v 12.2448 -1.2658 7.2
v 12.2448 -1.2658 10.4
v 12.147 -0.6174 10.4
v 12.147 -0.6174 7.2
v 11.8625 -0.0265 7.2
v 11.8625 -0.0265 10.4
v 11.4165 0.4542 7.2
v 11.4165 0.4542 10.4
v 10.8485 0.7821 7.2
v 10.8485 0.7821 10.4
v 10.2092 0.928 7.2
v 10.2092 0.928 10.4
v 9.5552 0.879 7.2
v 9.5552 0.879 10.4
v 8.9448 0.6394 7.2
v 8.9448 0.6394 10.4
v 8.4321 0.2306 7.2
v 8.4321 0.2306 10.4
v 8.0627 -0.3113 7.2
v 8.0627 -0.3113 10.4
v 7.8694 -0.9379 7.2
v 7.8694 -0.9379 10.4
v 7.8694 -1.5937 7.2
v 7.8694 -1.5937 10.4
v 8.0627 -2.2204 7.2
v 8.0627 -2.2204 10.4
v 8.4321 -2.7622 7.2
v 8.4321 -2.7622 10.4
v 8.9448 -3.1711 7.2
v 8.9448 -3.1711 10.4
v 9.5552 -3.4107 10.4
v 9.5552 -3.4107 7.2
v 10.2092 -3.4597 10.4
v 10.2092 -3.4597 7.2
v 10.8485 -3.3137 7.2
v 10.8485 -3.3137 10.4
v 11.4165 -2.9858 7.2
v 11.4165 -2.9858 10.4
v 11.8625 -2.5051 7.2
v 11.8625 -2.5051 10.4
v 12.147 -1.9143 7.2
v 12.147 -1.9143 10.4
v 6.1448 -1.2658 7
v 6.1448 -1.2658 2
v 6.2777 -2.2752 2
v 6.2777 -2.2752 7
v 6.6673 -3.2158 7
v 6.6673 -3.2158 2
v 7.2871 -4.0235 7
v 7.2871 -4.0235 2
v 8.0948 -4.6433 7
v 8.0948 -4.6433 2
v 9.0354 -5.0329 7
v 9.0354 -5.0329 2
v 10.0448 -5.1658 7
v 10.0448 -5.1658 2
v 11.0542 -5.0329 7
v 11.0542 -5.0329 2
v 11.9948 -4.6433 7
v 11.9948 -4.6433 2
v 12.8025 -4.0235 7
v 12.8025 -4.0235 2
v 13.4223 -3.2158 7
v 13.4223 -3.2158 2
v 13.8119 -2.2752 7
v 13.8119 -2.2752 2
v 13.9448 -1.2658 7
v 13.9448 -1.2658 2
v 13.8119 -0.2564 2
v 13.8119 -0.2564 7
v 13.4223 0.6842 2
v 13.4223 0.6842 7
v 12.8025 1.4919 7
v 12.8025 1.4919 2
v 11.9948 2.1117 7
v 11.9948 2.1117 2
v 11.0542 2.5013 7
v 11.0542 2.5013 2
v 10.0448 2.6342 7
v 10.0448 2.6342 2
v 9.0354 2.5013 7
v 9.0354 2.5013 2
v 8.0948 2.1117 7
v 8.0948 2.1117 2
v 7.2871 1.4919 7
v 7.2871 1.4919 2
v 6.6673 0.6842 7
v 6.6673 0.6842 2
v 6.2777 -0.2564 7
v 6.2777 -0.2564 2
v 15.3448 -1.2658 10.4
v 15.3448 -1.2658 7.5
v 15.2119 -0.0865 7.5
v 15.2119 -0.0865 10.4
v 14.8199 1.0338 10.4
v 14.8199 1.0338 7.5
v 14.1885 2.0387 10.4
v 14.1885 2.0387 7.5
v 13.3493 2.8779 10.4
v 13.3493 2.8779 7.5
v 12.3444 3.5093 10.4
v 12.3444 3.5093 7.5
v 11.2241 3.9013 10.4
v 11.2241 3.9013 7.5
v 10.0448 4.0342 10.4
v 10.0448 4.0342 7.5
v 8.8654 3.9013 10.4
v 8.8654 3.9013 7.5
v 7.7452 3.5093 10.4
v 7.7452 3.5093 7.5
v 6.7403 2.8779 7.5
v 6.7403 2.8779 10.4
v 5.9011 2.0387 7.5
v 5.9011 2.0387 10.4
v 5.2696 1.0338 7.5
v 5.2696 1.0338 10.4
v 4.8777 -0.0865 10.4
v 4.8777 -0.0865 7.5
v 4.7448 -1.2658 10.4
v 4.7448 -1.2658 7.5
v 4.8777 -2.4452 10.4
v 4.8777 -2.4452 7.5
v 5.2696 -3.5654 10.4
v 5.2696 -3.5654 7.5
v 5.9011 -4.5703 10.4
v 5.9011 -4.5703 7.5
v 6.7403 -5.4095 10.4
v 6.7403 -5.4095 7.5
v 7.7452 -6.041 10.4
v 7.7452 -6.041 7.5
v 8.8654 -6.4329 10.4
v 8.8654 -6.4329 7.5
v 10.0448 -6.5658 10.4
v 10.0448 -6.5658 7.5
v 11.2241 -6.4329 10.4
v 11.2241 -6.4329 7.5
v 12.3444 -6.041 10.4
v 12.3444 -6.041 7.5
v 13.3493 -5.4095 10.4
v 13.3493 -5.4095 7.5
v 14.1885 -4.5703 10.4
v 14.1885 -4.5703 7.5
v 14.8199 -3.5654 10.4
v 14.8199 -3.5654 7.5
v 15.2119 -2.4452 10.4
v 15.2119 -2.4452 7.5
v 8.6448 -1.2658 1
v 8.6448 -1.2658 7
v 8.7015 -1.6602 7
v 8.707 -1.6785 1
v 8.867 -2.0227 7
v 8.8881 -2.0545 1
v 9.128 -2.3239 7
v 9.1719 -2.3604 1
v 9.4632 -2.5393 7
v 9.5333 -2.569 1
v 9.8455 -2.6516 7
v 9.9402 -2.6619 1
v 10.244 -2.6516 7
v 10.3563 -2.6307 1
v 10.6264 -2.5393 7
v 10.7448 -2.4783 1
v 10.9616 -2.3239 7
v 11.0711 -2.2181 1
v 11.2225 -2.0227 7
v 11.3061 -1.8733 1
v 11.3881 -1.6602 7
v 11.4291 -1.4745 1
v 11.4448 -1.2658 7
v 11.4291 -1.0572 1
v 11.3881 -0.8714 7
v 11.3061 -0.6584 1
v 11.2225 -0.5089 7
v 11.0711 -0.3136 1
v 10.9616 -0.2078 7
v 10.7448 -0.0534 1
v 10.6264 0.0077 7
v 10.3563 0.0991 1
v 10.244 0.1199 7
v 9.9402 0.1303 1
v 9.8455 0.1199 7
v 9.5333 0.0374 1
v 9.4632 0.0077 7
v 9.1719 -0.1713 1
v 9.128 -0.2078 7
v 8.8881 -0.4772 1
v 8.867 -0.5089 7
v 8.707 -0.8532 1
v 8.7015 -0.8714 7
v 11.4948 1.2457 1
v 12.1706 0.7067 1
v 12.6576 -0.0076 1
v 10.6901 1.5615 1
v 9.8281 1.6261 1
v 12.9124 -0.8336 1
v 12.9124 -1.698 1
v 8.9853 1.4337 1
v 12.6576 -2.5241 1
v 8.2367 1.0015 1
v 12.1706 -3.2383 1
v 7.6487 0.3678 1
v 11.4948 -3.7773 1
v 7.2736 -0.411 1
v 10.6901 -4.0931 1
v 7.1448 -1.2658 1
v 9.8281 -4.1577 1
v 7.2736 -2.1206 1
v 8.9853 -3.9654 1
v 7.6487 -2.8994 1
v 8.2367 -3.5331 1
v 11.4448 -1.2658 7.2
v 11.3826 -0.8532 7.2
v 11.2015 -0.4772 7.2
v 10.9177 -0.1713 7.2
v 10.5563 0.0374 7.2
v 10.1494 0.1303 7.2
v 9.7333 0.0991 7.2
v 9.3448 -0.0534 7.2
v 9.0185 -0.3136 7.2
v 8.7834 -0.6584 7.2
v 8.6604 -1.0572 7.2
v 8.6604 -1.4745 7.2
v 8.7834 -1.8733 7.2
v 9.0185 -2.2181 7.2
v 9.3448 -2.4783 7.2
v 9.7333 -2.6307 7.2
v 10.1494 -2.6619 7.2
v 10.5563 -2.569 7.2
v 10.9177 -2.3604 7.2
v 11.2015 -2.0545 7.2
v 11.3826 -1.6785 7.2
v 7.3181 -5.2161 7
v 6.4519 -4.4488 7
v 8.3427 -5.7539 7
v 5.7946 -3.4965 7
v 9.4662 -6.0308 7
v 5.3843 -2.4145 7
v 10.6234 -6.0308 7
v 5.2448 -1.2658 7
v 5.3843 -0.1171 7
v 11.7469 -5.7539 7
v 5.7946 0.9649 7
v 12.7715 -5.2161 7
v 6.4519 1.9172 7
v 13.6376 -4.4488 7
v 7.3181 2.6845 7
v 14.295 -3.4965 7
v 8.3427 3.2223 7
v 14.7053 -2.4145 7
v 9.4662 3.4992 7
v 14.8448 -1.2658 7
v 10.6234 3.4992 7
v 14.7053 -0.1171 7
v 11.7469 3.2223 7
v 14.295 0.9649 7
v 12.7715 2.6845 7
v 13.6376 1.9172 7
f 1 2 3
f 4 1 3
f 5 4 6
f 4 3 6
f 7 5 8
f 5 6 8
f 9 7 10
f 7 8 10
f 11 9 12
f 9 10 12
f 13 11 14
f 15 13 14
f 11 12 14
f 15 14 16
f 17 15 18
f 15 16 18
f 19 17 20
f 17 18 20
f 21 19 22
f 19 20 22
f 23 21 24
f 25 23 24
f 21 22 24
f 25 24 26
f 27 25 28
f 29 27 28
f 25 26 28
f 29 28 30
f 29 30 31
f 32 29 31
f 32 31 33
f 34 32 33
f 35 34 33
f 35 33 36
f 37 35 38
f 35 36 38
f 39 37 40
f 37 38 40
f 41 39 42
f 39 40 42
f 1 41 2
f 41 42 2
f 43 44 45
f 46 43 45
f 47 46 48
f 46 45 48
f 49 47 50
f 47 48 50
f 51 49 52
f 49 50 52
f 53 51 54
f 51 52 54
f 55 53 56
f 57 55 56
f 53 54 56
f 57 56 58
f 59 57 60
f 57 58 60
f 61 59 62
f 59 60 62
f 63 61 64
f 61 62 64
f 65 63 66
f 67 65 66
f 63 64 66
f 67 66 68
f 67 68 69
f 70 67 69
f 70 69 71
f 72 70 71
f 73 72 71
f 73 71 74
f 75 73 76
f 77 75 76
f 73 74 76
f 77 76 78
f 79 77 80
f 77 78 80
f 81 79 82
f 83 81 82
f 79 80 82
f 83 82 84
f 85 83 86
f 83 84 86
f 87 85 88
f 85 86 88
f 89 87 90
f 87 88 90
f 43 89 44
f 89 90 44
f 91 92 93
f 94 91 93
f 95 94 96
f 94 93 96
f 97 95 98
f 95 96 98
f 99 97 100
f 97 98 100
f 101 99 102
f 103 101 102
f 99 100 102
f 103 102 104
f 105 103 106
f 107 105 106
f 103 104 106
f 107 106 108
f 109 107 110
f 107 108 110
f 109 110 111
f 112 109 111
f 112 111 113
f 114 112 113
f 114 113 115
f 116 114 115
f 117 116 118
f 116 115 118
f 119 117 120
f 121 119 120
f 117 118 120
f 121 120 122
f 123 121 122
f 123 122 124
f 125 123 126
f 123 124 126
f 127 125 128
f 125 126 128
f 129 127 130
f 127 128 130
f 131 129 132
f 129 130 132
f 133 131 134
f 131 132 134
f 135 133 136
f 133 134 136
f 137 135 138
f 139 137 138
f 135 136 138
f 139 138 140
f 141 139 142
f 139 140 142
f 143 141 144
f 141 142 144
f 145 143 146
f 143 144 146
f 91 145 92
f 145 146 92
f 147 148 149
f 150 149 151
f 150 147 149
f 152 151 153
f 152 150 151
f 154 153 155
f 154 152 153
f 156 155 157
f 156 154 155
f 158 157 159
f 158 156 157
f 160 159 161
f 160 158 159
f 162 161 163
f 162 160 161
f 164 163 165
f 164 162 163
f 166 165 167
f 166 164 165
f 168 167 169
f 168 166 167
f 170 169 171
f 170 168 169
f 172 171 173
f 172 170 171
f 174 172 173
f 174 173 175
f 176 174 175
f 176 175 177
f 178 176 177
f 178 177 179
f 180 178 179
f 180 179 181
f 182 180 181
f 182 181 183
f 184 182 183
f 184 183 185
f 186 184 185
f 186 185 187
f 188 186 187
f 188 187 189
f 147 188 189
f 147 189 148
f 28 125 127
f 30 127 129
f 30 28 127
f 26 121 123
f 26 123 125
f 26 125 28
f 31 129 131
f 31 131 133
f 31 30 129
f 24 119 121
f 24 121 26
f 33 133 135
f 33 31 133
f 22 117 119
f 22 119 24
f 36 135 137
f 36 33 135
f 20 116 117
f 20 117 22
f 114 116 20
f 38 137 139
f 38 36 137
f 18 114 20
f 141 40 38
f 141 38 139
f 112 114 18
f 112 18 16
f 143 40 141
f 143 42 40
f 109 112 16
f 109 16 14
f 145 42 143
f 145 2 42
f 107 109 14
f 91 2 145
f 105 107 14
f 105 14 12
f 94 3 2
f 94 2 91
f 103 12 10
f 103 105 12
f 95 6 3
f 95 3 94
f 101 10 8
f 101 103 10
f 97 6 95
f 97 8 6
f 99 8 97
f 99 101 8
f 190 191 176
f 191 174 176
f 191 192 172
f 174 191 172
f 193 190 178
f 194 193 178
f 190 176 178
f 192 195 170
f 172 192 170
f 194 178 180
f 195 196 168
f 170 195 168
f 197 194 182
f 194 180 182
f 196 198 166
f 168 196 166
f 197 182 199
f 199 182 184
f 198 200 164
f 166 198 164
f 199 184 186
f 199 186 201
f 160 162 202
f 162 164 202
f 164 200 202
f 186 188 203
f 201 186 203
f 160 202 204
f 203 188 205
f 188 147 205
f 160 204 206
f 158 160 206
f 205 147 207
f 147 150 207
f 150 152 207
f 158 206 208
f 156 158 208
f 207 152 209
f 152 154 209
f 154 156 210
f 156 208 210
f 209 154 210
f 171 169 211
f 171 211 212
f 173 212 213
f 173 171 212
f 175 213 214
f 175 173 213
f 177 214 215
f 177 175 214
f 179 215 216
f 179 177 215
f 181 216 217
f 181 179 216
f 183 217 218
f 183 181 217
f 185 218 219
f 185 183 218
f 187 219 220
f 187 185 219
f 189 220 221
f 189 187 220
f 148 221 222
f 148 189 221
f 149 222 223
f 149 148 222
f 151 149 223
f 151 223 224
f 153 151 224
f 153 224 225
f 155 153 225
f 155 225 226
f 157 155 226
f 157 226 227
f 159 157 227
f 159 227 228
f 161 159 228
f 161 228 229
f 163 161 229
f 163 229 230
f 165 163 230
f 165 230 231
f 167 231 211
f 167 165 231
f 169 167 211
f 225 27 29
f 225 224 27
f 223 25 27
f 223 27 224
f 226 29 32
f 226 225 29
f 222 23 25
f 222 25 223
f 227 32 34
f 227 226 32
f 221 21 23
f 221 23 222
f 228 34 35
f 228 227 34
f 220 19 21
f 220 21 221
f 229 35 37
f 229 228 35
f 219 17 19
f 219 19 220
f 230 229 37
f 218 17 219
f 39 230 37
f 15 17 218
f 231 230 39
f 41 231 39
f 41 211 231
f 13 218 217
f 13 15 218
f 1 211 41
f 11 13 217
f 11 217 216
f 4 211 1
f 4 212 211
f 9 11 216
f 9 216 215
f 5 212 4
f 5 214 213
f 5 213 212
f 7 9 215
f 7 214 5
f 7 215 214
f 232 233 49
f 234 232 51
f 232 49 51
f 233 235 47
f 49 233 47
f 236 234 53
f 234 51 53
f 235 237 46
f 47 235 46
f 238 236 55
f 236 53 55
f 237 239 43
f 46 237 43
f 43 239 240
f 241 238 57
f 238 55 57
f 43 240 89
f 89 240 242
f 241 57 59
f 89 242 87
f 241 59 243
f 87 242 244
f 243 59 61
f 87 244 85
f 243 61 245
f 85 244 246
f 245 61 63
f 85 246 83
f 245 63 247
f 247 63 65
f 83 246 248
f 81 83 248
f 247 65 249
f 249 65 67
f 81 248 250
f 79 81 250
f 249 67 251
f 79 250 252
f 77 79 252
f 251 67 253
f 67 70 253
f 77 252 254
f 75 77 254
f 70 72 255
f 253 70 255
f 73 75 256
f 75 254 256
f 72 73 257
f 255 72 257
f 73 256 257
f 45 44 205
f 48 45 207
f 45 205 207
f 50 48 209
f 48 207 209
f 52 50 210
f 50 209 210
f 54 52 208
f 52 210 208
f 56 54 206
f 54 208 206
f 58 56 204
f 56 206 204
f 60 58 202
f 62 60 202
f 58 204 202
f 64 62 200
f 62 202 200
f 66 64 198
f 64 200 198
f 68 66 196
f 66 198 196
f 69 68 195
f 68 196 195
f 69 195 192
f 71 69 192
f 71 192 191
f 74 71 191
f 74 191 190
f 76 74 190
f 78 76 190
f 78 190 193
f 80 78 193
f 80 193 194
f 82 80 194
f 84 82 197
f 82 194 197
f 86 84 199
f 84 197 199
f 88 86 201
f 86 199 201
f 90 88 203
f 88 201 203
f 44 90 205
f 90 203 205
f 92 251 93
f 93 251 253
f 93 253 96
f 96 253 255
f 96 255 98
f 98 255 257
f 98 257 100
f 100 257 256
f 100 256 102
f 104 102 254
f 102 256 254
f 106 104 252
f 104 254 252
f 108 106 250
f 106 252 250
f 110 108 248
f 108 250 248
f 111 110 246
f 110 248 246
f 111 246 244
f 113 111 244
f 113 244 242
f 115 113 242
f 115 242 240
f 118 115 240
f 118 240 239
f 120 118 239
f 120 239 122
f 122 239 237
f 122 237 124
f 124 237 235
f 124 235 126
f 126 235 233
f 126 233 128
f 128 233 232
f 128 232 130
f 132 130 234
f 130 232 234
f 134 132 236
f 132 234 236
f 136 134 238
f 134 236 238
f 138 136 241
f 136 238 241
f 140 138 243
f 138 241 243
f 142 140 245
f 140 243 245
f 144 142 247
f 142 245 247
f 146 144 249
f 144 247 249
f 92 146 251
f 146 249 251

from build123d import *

# Parameters (mm, degrees)
BOSS_EXTRUDE1_START = 1
SKETCH1_R           = 3.9
SKETCH1_R_2         = 1.4
BOSS_EXTRUDE1_DEPTH = 6
SKETCH2_R           = 5.3
SKETCH2_R_2         = 1.4
BOSS_EXTRUDE2_DEPTH = 3.4
CHAMFER1_SIZE       = 0.5
SKETCH3_R           = 2.2
CUT_EXTRUDE1_DEPTH  = 3.2
CHAMFER2_SIZE       = 1


with BuildPart() as part:
    # Sketch1 → Boss-Extrude1 (new body)
    with BuildSketch(Plane.XY.offset(BOSS_EXTRUDE1_START)):
        with Locations(Location((10.044784941, -1.265818107, 0), (0, 0, 180))):
            Circle(SKETCH1_R)
        with Locations(Location((10.044784941, -1.265818107, 0), (0, 0, 180))):
            Circle(SKETCH1_R_2, mode=Mode.SUBTRACT)
    extrude(amount=BOSS_EXTRUDE1_DEPTH)

    # Sketch2 → Boss-Extrude2 (add)
    with BuildSketch(Plane.XY.offset(7)):
        with Locations((10.044784941, -1.265818107)):
            Circle(SKETCH2_R)
        with Locations((10.044784941, -1.265818107)):
            Circle(SKETCH2_R_2, mode=Mode.SUBTRACT)
    extrude(amount=BOSS_EXTRUDE2_DEPTH)

    # Chamfer1
    chamfer1_edges = [part.edges().sort_by_distance(p)[0] for p in [
        (4.744784941, -1.265818107, 7),
    ]]
    chamfer(chamfer1_edges, length=CHAMFER1_SIZE)

    # Sketch3 → Cut-Extrude1 (cut)
    with BuildSketch(Plane.XY.offset(10.4)):
        with Locations((10.044784941, -1.265818107)):
            Circle(SKETCH3_R)
    extrude(amount=-CUT_EXTRUDE1_DEPTH, mode=Mode.SUBTRACT)

    # Chamfer2
    chamfer2_edges = [part.edges().sort_by_distance(p)[0] for p in [
        (13.944784941, -1.265818107, 1),
    ]]
    chamfer(chamfer2_edges, length=CHAMFER2_SIZE)


solid = part.part
